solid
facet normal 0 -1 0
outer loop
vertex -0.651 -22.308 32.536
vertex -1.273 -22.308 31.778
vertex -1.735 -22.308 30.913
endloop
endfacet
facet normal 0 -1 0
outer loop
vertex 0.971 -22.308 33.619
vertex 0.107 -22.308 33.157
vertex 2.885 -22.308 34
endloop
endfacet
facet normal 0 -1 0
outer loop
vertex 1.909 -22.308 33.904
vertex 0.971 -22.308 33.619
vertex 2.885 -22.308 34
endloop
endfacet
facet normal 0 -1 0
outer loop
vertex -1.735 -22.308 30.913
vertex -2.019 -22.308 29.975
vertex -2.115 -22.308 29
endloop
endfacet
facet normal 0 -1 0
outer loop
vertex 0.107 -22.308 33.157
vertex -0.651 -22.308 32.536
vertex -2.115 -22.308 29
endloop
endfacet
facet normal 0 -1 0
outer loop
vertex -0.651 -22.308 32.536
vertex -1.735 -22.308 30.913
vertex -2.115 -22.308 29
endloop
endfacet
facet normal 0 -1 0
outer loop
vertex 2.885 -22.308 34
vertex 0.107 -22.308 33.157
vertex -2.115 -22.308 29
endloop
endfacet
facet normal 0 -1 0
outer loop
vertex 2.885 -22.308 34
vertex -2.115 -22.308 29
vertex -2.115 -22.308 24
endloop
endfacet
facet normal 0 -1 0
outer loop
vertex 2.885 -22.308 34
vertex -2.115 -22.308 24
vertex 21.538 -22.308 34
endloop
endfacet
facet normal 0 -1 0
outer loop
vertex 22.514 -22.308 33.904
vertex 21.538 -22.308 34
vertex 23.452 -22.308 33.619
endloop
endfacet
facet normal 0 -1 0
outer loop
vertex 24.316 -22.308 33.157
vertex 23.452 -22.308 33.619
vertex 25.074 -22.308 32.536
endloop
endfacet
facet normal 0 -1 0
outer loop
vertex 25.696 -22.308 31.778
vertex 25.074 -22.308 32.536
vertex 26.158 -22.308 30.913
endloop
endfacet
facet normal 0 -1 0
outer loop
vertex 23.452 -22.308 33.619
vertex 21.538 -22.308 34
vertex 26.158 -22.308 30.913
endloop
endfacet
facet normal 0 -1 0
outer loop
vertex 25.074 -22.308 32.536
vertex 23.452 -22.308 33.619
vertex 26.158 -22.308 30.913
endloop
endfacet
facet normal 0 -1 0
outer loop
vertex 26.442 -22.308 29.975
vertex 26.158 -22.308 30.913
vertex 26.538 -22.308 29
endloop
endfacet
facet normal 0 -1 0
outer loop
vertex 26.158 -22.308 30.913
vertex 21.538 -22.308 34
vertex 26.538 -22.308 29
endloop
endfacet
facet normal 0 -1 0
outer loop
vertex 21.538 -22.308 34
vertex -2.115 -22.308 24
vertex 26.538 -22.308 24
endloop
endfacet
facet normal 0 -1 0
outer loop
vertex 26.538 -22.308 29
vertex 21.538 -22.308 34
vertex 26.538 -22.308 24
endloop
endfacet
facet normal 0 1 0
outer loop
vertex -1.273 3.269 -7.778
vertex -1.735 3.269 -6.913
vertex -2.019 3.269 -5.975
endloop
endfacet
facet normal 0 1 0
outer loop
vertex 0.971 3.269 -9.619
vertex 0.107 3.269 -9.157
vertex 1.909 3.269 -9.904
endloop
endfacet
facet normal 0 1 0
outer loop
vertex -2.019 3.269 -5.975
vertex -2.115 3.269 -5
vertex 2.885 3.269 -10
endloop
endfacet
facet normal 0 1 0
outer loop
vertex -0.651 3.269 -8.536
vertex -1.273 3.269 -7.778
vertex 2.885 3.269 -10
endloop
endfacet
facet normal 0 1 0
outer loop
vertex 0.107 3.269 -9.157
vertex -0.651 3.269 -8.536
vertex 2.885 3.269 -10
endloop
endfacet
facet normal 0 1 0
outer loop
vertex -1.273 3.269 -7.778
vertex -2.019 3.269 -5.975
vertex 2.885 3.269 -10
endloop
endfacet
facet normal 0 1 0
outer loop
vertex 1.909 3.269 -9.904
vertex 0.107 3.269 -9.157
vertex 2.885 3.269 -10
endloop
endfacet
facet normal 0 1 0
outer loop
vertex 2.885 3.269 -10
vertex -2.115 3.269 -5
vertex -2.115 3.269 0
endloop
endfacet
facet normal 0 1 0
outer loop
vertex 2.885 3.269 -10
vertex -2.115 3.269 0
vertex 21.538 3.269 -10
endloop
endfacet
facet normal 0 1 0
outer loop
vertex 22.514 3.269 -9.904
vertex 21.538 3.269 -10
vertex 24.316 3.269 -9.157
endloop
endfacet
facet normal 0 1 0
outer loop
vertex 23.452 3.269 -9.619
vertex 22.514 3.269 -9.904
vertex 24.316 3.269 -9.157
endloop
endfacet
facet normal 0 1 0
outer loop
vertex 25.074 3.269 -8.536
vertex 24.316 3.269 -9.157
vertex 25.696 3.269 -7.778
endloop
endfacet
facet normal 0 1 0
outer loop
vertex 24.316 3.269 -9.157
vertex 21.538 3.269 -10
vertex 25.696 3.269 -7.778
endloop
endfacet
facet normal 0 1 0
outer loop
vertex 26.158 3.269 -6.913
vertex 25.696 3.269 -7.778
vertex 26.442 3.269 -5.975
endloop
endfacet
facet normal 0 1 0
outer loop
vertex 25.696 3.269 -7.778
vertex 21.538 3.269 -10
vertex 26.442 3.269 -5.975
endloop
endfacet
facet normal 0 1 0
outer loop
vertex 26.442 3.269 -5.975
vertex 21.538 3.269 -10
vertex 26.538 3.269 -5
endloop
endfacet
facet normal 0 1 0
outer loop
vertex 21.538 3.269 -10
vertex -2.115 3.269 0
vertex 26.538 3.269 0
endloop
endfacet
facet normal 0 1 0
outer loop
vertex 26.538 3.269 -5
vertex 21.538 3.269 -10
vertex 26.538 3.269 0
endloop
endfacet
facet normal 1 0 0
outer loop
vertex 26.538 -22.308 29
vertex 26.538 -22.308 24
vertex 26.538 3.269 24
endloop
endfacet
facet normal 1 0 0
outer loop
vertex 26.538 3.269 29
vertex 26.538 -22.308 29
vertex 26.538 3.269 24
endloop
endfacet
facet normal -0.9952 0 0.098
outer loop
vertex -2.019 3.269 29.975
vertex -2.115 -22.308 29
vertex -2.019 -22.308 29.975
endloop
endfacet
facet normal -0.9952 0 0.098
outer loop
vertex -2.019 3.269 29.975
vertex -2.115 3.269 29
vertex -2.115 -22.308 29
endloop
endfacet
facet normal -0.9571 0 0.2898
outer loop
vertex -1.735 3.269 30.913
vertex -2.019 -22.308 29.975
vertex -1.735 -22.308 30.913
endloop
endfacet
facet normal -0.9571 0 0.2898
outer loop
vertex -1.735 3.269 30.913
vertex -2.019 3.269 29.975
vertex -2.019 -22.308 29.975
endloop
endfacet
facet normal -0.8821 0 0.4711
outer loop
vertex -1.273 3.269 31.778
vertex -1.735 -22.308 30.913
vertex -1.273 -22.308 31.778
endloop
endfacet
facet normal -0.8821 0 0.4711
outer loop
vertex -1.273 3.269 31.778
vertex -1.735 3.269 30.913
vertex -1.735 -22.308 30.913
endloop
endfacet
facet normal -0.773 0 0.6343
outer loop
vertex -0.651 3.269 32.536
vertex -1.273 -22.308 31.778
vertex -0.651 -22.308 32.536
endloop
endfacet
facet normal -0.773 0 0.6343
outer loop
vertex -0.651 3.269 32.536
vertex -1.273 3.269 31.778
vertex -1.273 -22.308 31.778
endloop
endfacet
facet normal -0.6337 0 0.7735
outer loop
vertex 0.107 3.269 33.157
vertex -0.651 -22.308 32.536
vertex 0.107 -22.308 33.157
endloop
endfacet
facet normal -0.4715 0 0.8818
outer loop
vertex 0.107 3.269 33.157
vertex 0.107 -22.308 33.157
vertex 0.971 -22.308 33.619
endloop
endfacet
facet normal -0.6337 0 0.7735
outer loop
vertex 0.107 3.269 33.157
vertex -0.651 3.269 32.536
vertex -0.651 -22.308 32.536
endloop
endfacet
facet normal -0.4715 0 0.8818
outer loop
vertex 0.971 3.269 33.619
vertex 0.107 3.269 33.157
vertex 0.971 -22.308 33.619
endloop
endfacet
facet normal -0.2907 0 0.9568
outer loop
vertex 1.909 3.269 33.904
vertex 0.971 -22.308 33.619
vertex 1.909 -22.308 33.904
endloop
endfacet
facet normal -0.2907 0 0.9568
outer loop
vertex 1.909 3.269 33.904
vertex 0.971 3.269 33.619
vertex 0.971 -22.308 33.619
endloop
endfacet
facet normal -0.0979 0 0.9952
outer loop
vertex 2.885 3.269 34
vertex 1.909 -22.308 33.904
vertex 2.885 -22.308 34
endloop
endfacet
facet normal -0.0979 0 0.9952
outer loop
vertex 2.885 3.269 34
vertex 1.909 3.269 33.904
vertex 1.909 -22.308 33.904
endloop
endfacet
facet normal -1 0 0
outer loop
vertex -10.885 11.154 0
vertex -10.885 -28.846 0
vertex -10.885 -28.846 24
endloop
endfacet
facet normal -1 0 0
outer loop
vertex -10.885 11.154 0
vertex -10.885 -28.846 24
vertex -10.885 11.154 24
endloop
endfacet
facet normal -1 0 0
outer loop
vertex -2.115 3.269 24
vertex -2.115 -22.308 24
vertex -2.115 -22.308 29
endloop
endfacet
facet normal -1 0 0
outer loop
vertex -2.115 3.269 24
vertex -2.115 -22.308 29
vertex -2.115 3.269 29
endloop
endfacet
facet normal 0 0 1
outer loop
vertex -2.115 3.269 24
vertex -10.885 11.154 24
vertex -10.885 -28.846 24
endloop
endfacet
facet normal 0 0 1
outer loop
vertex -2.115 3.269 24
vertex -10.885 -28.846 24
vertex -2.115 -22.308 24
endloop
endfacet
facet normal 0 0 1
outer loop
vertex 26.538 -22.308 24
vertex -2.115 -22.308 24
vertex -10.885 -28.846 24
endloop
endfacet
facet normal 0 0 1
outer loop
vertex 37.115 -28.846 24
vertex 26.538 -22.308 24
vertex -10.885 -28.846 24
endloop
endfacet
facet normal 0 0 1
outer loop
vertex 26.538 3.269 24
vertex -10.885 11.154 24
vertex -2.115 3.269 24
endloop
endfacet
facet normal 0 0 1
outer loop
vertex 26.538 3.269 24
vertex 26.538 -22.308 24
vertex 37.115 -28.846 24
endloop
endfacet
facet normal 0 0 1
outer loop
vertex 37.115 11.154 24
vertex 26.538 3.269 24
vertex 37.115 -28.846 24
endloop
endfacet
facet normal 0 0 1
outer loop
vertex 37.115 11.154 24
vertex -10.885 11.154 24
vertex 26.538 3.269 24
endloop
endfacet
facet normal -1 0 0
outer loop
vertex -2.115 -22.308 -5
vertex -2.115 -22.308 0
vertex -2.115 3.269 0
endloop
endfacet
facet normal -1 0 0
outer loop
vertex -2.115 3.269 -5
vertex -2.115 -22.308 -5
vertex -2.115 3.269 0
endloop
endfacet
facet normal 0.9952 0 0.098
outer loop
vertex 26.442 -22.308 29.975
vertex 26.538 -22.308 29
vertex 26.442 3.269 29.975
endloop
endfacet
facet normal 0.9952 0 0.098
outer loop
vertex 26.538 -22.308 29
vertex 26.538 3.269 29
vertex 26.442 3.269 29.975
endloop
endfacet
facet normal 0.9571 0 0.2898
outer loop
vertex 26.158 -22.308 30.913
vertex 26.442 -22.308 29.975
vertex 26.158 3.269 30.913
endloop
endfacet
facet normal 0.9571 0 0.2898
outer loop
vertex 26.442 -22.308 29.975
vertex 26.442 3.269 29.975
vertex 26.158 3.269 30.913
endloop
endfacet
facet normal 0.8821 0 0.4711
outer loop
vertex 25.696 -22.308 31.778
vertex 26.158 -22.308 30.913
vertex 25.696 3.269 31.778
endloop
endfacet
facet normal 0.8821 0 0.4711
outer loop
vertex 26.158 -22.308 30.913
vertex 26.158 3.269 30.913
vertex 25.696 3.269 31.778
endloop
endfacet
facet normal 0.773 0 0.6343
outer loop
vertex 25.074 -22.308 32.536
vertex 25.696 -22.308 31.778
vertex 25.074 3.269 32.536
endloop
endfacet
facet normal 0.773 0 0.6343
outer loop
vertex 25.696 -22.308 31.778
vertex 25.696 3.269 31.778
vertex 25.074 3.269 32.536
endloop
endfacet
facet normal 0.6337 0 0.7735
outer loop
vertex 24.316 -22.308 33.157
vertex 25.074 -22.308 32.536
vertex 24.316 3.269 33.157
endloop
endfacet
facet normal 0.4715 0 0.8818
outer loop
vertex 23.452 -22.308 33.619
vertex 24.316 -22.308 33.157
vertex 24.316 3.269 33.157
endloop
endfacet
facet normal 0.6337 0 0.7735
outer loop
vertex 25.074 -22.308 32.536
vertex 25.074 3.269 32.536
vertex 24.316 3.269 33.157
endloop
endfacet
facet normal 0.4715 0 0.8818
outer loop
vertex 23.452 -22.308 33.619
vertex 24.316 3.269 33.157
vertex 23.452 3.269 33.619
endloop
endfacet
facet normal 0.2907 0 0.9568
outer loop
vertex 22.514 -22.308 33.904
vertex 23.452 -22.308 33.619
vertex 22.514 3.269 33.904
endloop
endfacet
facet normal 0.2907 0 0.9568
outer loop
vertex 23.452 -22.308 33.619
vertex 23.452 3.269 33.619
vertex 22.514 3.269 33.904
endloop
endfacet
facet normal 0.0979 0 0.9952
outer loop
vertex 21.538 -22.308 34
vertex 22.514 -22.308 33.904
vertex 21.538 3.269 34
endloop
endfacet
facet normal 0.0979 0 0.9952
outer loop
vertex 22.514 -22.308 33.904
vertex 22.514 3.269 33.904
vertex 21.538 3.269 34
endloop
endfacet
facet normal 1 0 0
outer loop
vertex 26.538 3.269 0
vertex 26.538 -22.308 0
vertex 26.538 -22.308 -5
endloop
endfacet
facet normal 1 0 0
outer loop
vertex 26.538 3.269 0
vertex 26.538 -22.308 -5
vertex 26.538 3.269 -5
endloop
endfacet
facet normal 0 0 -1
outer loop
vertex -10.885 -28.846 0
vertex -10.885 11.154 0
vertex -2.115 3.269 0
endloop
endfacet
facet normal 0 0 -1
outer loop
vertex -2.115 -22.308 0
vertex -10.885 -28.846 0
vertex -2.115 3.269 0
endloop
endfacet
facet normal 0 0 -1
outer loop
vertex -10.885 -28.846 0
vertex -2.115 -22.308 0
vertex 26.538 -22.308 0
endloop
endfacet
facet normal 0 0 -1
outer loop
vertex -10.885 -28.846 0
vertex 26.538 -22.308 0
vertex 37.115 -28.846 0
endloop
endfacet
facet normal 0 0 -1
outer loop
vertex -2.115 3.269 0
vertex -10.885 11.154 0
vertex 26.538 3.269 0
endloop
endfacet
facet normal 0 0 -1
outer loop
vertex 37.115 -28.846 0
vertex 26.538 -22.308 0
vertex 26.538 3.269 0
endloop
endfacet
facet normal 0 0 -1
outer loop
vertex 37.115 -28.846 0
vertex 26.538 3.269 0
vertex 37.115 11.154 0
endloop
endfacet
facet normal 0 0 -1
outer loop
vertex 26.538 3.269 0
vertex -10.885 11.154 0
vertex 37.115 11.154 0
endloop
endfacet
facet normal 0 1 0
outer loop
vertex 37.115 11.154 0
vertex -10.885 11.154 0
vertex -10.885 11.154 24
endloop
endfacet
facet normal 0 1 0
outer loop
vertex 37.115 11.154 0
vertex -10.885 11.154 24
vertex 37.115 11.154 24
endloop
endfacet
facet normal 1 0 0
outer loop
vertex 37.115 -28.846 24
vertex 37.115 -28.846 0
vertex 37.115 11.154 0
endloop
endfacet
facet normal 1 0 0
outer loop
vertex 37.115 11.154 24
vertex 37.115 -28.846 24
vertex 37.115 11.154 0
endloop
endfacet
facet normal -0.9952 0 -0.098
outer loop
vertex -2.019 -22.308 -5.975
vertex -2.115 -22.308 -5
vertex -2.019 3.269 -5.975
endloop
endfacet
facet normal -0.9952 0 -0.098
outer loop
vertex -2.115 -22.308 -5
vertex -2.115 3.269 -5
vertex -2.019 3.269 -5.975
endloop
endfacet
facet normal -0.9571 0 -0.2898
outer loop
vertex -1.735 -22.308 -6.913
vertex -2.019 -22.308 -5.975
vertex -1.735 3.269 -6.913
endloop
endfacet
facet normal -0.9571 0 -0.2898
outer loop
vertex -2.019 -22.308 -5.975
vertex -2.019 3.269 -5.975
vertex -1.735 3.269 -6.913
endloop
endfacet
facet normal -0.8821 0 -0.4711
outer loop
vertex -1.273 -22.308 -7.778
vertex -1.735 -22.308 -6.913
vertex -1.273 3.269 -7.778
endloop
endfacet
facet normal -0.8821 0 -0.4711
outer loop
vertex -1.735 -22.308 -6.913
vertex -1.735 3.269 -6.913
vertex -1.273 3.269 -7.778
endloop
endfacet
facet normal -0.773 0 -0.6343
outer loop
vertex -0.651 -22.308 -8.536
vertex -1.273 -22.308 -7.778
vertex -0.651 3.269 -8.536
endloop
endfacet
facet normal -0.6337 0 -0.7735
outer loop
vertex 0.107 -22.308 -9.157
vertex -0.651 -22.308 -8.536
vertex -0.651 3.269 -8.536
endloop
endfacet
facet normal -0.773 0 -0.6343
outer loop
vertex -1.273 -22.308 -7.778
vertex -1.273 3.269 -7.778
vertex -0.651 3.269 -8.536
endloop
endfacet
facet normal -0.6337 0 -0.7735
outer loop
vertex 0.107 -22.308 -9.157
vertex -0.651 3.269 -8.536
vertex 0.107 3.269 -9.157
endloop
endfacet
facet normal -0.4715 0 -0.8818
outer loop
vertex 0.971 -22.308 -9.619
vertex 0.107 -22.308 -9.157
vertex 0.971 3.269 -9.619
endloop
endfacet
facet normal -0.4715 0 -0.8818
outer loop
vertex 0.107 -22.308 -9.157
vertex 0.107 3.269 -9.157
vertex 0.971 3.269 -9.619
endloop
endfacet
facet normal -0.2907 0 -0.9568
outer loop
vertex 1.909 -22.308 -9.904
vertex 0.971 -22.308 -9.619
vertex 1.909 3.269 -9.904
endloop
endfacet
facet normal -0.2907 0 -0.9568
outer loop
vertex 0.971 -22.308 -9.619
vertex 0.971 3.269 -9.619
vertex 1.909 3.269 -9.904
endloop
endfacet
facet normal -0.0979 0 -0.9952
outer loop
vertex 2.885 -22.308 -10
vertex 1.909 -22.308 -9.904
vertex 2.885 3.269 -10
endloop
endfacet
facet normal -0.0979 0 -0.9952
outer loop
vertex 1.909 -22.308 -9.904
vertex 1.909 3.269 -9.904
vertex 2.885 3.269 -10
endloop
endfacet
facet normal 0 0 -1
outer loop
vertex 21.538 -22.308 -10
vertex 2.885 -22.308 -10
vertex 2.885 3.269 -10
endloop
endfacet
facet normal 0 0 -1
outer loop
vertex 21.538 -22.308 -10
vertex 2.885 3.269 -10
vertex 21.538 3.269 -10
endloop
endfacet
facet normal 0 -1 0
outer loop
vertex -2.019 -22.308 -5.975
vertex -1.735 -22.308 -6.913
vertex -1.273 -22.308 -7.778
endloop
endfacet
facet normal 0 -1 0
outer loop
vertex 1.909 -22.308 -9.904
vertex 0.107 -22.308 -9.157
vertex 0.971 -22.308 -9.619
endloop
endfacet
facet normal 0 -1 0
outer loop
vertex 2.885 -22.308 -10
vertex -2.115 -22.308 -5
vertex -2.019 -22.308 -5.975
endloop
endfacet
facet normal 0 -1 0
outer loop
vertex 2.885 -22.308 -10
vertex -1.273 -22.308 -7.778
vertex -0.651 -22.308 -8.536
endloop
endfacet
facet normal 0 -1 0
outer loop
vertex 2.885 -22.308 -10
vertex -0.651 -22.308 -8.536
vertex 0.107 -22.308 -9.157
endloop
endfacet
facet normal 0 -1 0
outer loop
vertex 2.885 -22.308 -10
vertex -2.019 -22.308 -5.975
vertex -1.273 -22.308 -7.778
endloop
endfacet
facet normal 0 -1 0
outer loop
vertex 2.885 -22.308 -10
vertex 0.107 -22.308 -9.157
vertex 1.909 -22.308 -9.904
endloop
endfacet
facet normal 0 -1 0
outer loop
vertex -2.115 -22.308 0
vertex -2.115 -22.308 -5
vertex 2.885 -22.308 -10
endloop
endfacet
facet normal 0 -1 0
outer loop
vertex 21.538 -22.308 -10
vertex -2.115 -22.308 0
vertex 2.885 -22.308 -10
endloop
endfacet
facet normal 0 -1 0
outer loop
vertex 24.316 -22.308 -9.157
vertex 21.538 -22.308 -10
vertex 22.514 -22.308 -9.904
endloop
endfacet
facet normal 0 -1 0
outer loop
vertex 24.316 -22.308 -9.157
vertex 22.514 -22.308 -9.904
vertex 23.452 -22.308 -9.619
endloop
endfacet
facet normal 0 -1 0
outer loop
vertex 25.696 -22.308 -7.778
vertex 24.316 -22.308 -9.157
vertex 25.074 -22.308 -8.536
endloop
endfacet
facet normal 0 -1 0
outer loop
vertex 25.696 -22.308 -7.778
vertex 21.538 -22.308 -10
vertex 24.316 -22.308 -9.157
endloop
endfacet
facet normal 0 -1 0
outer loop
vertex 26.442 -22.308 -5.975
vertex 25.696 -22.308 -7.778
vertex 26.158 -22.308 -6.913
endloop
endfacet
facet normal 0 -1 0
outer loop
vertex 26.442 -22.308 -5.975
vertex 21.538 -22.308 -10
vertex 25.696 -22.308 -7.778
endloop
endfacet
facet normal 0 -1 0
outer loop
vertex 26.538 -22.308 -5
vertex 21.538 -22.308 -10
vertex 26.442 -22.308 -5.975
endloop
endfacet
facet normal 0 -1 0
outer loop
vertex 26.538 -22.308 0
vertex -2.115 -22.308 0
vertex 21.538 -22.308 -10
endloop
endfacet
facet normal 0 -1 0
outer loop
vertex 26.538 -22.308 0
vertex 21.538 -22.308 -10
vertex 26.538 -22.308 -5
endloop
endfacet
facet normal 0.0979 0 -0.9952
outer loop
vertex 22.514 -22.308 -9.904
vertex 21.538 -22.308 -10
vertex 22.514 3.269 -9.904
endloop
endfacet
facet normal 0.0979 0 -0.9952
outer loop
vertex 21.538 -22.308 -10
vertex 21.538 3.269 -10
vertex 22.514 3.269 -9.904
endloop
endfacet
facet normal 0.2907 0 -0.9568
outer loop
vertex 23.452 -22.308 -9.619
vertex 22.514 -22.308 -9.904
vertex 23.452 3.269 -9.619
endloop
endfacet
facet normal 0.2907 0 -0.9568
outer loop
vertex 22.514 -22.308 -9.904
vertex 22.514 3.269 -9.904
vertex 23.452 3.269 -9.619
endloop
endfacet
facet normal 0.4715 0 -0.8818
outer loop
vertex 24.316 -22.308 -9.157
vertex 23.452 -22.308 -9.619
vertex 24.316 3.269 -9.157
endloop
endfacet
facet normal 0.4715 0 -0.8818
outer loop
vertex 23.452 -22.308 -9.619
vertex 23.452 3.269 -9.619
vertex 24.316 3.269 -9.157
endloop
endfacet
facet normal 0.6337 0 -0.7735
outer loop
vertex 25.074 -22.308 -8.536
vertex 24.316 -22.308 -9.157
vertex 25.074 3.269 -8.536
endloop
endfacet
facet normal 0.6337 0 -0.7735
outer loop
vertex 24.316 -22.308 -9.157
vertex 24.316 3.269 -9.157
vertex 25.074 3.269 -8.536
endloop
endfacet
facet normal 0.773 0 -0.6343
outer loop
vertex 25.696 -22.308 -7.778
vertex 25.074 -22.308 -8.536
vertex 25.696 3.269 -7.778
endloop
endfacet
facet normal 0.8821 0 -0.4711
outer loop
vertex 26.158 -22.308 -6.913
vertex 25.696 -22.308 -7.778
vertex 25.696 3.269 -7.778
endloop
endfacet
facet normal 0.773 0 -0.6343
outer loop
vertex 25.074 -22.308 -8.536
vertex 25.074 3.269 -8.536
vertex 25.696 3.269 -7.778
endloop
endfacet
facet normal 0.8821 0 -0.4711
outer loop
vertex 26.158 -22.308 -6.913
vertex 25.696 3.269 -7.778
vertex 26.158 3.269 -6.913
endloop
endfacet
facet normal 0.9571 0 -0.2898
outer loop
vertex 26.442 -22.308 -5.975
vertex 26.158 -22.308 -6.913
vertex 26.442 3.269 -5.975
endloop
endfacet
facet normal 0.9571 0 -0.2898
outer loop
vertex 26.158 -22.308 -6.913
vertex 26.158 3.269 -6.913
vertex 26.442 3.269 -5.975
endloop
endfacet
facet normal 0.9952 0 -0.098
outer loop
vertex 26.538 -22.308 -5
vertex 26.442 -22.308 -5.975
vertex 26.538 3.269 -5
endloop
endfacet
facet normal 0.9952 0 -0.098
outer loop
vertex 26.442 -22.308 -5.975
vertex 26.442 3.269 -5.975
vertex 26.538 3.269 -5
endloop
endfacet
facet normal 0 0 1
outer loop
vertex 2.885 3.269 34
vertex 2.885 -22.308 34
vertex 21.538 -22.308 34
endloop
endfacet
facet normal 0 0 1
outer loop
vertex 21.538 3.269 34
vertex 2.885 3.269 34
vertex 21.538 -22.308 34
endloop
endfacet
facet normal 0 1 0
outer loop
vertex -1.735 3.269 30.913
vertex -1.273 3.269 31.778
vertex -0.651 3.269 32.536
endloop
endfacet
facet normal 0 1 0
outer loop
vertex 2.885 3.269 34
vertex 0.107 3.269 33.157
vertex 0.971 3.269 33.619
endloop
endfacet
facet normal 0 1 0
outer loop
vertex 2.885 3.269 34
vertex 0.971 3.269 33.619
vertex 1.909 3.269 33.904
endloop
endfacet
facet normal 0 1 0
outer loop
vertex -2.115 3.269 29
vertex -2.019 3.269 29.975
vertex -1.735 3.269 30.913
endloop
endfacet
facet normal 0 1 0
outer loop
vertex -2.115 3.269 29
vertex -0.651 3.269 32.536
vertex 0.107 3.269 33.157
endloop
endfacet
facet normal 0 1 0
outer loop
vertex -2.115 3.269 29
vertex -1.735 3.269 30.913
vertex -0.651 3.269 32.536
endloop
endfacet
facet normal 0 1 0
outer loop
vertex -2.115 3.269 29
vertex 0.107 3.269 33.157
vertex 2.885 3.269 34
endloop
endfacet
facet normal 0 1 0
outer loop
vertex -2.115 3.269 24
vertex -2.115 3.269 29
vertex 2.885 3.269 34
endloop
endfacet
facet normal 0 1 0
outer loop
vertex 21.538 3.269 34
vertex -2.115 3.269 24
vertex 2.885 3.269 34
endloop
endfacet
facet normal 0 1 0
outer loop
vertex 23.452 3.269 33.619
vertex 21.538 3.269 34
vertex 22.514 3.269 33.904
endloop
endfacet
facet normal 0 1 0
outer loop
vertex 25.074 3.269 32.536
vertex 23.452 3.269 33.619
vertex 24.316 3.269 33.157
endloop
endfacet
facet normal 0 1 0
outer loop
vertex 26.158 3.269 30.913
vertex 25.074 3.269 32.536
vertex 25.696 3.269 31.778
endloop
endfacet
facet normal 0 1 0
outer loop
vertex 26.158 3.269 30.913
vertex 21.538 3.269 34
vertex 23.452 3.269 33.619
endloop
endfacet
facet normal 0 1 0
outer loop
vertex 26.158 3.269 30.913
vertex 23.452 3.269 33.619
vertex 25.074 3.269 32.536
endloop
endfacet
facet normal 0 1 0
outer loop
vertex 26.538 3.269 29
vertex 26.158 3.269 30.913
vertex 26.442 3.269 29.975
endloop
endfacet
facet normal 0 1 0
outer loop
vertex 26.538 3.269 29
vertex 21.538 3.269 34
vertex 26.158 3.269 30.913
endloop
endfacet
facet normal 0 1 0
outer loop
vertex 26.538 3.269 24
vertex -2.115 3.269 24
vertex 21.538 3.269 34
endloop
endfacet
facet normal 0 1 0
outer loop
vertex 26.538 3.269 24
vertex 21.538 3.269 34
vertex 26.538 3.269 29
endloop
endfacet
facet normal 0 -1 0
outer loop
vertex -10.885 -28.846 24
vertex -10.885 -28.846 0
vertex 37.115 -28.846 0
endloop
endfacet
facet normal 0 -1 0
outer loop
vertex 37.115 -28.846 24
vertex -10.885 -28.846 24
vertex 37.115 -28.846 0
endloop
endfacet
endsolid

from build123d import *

# Parameters (mm, degrees)
F0_W          = 48
F0_H          = 40
F1_DEPTH      = 24
F2_W          = 28.65385
F2_H          = 25.576925
F3_DEPTH      = 10
F3_DEPTH_BACK = 34
F4_R          = 5


with BuildPart() as f1:
    # F0 (on Top) → F1 (new body)
    with BuildSketch(Plane.XY):
        with Locations((13.115388, -8.846156)):
            Rectangle(F0_W, F0_H)
    extrude(amount=F1_DEPTH)

    # F2 (on face) → F3 (join, two sides)
    with BuildSketch(Plane.XY.offset(24)) as f3_sk:
        with Locations((12.21154, -9.519231)):
            Rectangle(F2_W, F2_H)
    extrude(amount=F3_DEPTH)
    extrude(f3_sk.sketch, amount=-F3_DEPTH_BACK)

    # F4
    f4_edges = [f1.edges().sort_by_distance(p)[0] for p in [
        (26.538465, -9.519232, 34),
        (26.538465, -9.519232, -10),
        (-2.115385, -9.519232, -10),
        (-2.115385, -9.519232, 34),
    ]]
    fillet(f4_edges, radius=F4_R)


solid = f1.part
